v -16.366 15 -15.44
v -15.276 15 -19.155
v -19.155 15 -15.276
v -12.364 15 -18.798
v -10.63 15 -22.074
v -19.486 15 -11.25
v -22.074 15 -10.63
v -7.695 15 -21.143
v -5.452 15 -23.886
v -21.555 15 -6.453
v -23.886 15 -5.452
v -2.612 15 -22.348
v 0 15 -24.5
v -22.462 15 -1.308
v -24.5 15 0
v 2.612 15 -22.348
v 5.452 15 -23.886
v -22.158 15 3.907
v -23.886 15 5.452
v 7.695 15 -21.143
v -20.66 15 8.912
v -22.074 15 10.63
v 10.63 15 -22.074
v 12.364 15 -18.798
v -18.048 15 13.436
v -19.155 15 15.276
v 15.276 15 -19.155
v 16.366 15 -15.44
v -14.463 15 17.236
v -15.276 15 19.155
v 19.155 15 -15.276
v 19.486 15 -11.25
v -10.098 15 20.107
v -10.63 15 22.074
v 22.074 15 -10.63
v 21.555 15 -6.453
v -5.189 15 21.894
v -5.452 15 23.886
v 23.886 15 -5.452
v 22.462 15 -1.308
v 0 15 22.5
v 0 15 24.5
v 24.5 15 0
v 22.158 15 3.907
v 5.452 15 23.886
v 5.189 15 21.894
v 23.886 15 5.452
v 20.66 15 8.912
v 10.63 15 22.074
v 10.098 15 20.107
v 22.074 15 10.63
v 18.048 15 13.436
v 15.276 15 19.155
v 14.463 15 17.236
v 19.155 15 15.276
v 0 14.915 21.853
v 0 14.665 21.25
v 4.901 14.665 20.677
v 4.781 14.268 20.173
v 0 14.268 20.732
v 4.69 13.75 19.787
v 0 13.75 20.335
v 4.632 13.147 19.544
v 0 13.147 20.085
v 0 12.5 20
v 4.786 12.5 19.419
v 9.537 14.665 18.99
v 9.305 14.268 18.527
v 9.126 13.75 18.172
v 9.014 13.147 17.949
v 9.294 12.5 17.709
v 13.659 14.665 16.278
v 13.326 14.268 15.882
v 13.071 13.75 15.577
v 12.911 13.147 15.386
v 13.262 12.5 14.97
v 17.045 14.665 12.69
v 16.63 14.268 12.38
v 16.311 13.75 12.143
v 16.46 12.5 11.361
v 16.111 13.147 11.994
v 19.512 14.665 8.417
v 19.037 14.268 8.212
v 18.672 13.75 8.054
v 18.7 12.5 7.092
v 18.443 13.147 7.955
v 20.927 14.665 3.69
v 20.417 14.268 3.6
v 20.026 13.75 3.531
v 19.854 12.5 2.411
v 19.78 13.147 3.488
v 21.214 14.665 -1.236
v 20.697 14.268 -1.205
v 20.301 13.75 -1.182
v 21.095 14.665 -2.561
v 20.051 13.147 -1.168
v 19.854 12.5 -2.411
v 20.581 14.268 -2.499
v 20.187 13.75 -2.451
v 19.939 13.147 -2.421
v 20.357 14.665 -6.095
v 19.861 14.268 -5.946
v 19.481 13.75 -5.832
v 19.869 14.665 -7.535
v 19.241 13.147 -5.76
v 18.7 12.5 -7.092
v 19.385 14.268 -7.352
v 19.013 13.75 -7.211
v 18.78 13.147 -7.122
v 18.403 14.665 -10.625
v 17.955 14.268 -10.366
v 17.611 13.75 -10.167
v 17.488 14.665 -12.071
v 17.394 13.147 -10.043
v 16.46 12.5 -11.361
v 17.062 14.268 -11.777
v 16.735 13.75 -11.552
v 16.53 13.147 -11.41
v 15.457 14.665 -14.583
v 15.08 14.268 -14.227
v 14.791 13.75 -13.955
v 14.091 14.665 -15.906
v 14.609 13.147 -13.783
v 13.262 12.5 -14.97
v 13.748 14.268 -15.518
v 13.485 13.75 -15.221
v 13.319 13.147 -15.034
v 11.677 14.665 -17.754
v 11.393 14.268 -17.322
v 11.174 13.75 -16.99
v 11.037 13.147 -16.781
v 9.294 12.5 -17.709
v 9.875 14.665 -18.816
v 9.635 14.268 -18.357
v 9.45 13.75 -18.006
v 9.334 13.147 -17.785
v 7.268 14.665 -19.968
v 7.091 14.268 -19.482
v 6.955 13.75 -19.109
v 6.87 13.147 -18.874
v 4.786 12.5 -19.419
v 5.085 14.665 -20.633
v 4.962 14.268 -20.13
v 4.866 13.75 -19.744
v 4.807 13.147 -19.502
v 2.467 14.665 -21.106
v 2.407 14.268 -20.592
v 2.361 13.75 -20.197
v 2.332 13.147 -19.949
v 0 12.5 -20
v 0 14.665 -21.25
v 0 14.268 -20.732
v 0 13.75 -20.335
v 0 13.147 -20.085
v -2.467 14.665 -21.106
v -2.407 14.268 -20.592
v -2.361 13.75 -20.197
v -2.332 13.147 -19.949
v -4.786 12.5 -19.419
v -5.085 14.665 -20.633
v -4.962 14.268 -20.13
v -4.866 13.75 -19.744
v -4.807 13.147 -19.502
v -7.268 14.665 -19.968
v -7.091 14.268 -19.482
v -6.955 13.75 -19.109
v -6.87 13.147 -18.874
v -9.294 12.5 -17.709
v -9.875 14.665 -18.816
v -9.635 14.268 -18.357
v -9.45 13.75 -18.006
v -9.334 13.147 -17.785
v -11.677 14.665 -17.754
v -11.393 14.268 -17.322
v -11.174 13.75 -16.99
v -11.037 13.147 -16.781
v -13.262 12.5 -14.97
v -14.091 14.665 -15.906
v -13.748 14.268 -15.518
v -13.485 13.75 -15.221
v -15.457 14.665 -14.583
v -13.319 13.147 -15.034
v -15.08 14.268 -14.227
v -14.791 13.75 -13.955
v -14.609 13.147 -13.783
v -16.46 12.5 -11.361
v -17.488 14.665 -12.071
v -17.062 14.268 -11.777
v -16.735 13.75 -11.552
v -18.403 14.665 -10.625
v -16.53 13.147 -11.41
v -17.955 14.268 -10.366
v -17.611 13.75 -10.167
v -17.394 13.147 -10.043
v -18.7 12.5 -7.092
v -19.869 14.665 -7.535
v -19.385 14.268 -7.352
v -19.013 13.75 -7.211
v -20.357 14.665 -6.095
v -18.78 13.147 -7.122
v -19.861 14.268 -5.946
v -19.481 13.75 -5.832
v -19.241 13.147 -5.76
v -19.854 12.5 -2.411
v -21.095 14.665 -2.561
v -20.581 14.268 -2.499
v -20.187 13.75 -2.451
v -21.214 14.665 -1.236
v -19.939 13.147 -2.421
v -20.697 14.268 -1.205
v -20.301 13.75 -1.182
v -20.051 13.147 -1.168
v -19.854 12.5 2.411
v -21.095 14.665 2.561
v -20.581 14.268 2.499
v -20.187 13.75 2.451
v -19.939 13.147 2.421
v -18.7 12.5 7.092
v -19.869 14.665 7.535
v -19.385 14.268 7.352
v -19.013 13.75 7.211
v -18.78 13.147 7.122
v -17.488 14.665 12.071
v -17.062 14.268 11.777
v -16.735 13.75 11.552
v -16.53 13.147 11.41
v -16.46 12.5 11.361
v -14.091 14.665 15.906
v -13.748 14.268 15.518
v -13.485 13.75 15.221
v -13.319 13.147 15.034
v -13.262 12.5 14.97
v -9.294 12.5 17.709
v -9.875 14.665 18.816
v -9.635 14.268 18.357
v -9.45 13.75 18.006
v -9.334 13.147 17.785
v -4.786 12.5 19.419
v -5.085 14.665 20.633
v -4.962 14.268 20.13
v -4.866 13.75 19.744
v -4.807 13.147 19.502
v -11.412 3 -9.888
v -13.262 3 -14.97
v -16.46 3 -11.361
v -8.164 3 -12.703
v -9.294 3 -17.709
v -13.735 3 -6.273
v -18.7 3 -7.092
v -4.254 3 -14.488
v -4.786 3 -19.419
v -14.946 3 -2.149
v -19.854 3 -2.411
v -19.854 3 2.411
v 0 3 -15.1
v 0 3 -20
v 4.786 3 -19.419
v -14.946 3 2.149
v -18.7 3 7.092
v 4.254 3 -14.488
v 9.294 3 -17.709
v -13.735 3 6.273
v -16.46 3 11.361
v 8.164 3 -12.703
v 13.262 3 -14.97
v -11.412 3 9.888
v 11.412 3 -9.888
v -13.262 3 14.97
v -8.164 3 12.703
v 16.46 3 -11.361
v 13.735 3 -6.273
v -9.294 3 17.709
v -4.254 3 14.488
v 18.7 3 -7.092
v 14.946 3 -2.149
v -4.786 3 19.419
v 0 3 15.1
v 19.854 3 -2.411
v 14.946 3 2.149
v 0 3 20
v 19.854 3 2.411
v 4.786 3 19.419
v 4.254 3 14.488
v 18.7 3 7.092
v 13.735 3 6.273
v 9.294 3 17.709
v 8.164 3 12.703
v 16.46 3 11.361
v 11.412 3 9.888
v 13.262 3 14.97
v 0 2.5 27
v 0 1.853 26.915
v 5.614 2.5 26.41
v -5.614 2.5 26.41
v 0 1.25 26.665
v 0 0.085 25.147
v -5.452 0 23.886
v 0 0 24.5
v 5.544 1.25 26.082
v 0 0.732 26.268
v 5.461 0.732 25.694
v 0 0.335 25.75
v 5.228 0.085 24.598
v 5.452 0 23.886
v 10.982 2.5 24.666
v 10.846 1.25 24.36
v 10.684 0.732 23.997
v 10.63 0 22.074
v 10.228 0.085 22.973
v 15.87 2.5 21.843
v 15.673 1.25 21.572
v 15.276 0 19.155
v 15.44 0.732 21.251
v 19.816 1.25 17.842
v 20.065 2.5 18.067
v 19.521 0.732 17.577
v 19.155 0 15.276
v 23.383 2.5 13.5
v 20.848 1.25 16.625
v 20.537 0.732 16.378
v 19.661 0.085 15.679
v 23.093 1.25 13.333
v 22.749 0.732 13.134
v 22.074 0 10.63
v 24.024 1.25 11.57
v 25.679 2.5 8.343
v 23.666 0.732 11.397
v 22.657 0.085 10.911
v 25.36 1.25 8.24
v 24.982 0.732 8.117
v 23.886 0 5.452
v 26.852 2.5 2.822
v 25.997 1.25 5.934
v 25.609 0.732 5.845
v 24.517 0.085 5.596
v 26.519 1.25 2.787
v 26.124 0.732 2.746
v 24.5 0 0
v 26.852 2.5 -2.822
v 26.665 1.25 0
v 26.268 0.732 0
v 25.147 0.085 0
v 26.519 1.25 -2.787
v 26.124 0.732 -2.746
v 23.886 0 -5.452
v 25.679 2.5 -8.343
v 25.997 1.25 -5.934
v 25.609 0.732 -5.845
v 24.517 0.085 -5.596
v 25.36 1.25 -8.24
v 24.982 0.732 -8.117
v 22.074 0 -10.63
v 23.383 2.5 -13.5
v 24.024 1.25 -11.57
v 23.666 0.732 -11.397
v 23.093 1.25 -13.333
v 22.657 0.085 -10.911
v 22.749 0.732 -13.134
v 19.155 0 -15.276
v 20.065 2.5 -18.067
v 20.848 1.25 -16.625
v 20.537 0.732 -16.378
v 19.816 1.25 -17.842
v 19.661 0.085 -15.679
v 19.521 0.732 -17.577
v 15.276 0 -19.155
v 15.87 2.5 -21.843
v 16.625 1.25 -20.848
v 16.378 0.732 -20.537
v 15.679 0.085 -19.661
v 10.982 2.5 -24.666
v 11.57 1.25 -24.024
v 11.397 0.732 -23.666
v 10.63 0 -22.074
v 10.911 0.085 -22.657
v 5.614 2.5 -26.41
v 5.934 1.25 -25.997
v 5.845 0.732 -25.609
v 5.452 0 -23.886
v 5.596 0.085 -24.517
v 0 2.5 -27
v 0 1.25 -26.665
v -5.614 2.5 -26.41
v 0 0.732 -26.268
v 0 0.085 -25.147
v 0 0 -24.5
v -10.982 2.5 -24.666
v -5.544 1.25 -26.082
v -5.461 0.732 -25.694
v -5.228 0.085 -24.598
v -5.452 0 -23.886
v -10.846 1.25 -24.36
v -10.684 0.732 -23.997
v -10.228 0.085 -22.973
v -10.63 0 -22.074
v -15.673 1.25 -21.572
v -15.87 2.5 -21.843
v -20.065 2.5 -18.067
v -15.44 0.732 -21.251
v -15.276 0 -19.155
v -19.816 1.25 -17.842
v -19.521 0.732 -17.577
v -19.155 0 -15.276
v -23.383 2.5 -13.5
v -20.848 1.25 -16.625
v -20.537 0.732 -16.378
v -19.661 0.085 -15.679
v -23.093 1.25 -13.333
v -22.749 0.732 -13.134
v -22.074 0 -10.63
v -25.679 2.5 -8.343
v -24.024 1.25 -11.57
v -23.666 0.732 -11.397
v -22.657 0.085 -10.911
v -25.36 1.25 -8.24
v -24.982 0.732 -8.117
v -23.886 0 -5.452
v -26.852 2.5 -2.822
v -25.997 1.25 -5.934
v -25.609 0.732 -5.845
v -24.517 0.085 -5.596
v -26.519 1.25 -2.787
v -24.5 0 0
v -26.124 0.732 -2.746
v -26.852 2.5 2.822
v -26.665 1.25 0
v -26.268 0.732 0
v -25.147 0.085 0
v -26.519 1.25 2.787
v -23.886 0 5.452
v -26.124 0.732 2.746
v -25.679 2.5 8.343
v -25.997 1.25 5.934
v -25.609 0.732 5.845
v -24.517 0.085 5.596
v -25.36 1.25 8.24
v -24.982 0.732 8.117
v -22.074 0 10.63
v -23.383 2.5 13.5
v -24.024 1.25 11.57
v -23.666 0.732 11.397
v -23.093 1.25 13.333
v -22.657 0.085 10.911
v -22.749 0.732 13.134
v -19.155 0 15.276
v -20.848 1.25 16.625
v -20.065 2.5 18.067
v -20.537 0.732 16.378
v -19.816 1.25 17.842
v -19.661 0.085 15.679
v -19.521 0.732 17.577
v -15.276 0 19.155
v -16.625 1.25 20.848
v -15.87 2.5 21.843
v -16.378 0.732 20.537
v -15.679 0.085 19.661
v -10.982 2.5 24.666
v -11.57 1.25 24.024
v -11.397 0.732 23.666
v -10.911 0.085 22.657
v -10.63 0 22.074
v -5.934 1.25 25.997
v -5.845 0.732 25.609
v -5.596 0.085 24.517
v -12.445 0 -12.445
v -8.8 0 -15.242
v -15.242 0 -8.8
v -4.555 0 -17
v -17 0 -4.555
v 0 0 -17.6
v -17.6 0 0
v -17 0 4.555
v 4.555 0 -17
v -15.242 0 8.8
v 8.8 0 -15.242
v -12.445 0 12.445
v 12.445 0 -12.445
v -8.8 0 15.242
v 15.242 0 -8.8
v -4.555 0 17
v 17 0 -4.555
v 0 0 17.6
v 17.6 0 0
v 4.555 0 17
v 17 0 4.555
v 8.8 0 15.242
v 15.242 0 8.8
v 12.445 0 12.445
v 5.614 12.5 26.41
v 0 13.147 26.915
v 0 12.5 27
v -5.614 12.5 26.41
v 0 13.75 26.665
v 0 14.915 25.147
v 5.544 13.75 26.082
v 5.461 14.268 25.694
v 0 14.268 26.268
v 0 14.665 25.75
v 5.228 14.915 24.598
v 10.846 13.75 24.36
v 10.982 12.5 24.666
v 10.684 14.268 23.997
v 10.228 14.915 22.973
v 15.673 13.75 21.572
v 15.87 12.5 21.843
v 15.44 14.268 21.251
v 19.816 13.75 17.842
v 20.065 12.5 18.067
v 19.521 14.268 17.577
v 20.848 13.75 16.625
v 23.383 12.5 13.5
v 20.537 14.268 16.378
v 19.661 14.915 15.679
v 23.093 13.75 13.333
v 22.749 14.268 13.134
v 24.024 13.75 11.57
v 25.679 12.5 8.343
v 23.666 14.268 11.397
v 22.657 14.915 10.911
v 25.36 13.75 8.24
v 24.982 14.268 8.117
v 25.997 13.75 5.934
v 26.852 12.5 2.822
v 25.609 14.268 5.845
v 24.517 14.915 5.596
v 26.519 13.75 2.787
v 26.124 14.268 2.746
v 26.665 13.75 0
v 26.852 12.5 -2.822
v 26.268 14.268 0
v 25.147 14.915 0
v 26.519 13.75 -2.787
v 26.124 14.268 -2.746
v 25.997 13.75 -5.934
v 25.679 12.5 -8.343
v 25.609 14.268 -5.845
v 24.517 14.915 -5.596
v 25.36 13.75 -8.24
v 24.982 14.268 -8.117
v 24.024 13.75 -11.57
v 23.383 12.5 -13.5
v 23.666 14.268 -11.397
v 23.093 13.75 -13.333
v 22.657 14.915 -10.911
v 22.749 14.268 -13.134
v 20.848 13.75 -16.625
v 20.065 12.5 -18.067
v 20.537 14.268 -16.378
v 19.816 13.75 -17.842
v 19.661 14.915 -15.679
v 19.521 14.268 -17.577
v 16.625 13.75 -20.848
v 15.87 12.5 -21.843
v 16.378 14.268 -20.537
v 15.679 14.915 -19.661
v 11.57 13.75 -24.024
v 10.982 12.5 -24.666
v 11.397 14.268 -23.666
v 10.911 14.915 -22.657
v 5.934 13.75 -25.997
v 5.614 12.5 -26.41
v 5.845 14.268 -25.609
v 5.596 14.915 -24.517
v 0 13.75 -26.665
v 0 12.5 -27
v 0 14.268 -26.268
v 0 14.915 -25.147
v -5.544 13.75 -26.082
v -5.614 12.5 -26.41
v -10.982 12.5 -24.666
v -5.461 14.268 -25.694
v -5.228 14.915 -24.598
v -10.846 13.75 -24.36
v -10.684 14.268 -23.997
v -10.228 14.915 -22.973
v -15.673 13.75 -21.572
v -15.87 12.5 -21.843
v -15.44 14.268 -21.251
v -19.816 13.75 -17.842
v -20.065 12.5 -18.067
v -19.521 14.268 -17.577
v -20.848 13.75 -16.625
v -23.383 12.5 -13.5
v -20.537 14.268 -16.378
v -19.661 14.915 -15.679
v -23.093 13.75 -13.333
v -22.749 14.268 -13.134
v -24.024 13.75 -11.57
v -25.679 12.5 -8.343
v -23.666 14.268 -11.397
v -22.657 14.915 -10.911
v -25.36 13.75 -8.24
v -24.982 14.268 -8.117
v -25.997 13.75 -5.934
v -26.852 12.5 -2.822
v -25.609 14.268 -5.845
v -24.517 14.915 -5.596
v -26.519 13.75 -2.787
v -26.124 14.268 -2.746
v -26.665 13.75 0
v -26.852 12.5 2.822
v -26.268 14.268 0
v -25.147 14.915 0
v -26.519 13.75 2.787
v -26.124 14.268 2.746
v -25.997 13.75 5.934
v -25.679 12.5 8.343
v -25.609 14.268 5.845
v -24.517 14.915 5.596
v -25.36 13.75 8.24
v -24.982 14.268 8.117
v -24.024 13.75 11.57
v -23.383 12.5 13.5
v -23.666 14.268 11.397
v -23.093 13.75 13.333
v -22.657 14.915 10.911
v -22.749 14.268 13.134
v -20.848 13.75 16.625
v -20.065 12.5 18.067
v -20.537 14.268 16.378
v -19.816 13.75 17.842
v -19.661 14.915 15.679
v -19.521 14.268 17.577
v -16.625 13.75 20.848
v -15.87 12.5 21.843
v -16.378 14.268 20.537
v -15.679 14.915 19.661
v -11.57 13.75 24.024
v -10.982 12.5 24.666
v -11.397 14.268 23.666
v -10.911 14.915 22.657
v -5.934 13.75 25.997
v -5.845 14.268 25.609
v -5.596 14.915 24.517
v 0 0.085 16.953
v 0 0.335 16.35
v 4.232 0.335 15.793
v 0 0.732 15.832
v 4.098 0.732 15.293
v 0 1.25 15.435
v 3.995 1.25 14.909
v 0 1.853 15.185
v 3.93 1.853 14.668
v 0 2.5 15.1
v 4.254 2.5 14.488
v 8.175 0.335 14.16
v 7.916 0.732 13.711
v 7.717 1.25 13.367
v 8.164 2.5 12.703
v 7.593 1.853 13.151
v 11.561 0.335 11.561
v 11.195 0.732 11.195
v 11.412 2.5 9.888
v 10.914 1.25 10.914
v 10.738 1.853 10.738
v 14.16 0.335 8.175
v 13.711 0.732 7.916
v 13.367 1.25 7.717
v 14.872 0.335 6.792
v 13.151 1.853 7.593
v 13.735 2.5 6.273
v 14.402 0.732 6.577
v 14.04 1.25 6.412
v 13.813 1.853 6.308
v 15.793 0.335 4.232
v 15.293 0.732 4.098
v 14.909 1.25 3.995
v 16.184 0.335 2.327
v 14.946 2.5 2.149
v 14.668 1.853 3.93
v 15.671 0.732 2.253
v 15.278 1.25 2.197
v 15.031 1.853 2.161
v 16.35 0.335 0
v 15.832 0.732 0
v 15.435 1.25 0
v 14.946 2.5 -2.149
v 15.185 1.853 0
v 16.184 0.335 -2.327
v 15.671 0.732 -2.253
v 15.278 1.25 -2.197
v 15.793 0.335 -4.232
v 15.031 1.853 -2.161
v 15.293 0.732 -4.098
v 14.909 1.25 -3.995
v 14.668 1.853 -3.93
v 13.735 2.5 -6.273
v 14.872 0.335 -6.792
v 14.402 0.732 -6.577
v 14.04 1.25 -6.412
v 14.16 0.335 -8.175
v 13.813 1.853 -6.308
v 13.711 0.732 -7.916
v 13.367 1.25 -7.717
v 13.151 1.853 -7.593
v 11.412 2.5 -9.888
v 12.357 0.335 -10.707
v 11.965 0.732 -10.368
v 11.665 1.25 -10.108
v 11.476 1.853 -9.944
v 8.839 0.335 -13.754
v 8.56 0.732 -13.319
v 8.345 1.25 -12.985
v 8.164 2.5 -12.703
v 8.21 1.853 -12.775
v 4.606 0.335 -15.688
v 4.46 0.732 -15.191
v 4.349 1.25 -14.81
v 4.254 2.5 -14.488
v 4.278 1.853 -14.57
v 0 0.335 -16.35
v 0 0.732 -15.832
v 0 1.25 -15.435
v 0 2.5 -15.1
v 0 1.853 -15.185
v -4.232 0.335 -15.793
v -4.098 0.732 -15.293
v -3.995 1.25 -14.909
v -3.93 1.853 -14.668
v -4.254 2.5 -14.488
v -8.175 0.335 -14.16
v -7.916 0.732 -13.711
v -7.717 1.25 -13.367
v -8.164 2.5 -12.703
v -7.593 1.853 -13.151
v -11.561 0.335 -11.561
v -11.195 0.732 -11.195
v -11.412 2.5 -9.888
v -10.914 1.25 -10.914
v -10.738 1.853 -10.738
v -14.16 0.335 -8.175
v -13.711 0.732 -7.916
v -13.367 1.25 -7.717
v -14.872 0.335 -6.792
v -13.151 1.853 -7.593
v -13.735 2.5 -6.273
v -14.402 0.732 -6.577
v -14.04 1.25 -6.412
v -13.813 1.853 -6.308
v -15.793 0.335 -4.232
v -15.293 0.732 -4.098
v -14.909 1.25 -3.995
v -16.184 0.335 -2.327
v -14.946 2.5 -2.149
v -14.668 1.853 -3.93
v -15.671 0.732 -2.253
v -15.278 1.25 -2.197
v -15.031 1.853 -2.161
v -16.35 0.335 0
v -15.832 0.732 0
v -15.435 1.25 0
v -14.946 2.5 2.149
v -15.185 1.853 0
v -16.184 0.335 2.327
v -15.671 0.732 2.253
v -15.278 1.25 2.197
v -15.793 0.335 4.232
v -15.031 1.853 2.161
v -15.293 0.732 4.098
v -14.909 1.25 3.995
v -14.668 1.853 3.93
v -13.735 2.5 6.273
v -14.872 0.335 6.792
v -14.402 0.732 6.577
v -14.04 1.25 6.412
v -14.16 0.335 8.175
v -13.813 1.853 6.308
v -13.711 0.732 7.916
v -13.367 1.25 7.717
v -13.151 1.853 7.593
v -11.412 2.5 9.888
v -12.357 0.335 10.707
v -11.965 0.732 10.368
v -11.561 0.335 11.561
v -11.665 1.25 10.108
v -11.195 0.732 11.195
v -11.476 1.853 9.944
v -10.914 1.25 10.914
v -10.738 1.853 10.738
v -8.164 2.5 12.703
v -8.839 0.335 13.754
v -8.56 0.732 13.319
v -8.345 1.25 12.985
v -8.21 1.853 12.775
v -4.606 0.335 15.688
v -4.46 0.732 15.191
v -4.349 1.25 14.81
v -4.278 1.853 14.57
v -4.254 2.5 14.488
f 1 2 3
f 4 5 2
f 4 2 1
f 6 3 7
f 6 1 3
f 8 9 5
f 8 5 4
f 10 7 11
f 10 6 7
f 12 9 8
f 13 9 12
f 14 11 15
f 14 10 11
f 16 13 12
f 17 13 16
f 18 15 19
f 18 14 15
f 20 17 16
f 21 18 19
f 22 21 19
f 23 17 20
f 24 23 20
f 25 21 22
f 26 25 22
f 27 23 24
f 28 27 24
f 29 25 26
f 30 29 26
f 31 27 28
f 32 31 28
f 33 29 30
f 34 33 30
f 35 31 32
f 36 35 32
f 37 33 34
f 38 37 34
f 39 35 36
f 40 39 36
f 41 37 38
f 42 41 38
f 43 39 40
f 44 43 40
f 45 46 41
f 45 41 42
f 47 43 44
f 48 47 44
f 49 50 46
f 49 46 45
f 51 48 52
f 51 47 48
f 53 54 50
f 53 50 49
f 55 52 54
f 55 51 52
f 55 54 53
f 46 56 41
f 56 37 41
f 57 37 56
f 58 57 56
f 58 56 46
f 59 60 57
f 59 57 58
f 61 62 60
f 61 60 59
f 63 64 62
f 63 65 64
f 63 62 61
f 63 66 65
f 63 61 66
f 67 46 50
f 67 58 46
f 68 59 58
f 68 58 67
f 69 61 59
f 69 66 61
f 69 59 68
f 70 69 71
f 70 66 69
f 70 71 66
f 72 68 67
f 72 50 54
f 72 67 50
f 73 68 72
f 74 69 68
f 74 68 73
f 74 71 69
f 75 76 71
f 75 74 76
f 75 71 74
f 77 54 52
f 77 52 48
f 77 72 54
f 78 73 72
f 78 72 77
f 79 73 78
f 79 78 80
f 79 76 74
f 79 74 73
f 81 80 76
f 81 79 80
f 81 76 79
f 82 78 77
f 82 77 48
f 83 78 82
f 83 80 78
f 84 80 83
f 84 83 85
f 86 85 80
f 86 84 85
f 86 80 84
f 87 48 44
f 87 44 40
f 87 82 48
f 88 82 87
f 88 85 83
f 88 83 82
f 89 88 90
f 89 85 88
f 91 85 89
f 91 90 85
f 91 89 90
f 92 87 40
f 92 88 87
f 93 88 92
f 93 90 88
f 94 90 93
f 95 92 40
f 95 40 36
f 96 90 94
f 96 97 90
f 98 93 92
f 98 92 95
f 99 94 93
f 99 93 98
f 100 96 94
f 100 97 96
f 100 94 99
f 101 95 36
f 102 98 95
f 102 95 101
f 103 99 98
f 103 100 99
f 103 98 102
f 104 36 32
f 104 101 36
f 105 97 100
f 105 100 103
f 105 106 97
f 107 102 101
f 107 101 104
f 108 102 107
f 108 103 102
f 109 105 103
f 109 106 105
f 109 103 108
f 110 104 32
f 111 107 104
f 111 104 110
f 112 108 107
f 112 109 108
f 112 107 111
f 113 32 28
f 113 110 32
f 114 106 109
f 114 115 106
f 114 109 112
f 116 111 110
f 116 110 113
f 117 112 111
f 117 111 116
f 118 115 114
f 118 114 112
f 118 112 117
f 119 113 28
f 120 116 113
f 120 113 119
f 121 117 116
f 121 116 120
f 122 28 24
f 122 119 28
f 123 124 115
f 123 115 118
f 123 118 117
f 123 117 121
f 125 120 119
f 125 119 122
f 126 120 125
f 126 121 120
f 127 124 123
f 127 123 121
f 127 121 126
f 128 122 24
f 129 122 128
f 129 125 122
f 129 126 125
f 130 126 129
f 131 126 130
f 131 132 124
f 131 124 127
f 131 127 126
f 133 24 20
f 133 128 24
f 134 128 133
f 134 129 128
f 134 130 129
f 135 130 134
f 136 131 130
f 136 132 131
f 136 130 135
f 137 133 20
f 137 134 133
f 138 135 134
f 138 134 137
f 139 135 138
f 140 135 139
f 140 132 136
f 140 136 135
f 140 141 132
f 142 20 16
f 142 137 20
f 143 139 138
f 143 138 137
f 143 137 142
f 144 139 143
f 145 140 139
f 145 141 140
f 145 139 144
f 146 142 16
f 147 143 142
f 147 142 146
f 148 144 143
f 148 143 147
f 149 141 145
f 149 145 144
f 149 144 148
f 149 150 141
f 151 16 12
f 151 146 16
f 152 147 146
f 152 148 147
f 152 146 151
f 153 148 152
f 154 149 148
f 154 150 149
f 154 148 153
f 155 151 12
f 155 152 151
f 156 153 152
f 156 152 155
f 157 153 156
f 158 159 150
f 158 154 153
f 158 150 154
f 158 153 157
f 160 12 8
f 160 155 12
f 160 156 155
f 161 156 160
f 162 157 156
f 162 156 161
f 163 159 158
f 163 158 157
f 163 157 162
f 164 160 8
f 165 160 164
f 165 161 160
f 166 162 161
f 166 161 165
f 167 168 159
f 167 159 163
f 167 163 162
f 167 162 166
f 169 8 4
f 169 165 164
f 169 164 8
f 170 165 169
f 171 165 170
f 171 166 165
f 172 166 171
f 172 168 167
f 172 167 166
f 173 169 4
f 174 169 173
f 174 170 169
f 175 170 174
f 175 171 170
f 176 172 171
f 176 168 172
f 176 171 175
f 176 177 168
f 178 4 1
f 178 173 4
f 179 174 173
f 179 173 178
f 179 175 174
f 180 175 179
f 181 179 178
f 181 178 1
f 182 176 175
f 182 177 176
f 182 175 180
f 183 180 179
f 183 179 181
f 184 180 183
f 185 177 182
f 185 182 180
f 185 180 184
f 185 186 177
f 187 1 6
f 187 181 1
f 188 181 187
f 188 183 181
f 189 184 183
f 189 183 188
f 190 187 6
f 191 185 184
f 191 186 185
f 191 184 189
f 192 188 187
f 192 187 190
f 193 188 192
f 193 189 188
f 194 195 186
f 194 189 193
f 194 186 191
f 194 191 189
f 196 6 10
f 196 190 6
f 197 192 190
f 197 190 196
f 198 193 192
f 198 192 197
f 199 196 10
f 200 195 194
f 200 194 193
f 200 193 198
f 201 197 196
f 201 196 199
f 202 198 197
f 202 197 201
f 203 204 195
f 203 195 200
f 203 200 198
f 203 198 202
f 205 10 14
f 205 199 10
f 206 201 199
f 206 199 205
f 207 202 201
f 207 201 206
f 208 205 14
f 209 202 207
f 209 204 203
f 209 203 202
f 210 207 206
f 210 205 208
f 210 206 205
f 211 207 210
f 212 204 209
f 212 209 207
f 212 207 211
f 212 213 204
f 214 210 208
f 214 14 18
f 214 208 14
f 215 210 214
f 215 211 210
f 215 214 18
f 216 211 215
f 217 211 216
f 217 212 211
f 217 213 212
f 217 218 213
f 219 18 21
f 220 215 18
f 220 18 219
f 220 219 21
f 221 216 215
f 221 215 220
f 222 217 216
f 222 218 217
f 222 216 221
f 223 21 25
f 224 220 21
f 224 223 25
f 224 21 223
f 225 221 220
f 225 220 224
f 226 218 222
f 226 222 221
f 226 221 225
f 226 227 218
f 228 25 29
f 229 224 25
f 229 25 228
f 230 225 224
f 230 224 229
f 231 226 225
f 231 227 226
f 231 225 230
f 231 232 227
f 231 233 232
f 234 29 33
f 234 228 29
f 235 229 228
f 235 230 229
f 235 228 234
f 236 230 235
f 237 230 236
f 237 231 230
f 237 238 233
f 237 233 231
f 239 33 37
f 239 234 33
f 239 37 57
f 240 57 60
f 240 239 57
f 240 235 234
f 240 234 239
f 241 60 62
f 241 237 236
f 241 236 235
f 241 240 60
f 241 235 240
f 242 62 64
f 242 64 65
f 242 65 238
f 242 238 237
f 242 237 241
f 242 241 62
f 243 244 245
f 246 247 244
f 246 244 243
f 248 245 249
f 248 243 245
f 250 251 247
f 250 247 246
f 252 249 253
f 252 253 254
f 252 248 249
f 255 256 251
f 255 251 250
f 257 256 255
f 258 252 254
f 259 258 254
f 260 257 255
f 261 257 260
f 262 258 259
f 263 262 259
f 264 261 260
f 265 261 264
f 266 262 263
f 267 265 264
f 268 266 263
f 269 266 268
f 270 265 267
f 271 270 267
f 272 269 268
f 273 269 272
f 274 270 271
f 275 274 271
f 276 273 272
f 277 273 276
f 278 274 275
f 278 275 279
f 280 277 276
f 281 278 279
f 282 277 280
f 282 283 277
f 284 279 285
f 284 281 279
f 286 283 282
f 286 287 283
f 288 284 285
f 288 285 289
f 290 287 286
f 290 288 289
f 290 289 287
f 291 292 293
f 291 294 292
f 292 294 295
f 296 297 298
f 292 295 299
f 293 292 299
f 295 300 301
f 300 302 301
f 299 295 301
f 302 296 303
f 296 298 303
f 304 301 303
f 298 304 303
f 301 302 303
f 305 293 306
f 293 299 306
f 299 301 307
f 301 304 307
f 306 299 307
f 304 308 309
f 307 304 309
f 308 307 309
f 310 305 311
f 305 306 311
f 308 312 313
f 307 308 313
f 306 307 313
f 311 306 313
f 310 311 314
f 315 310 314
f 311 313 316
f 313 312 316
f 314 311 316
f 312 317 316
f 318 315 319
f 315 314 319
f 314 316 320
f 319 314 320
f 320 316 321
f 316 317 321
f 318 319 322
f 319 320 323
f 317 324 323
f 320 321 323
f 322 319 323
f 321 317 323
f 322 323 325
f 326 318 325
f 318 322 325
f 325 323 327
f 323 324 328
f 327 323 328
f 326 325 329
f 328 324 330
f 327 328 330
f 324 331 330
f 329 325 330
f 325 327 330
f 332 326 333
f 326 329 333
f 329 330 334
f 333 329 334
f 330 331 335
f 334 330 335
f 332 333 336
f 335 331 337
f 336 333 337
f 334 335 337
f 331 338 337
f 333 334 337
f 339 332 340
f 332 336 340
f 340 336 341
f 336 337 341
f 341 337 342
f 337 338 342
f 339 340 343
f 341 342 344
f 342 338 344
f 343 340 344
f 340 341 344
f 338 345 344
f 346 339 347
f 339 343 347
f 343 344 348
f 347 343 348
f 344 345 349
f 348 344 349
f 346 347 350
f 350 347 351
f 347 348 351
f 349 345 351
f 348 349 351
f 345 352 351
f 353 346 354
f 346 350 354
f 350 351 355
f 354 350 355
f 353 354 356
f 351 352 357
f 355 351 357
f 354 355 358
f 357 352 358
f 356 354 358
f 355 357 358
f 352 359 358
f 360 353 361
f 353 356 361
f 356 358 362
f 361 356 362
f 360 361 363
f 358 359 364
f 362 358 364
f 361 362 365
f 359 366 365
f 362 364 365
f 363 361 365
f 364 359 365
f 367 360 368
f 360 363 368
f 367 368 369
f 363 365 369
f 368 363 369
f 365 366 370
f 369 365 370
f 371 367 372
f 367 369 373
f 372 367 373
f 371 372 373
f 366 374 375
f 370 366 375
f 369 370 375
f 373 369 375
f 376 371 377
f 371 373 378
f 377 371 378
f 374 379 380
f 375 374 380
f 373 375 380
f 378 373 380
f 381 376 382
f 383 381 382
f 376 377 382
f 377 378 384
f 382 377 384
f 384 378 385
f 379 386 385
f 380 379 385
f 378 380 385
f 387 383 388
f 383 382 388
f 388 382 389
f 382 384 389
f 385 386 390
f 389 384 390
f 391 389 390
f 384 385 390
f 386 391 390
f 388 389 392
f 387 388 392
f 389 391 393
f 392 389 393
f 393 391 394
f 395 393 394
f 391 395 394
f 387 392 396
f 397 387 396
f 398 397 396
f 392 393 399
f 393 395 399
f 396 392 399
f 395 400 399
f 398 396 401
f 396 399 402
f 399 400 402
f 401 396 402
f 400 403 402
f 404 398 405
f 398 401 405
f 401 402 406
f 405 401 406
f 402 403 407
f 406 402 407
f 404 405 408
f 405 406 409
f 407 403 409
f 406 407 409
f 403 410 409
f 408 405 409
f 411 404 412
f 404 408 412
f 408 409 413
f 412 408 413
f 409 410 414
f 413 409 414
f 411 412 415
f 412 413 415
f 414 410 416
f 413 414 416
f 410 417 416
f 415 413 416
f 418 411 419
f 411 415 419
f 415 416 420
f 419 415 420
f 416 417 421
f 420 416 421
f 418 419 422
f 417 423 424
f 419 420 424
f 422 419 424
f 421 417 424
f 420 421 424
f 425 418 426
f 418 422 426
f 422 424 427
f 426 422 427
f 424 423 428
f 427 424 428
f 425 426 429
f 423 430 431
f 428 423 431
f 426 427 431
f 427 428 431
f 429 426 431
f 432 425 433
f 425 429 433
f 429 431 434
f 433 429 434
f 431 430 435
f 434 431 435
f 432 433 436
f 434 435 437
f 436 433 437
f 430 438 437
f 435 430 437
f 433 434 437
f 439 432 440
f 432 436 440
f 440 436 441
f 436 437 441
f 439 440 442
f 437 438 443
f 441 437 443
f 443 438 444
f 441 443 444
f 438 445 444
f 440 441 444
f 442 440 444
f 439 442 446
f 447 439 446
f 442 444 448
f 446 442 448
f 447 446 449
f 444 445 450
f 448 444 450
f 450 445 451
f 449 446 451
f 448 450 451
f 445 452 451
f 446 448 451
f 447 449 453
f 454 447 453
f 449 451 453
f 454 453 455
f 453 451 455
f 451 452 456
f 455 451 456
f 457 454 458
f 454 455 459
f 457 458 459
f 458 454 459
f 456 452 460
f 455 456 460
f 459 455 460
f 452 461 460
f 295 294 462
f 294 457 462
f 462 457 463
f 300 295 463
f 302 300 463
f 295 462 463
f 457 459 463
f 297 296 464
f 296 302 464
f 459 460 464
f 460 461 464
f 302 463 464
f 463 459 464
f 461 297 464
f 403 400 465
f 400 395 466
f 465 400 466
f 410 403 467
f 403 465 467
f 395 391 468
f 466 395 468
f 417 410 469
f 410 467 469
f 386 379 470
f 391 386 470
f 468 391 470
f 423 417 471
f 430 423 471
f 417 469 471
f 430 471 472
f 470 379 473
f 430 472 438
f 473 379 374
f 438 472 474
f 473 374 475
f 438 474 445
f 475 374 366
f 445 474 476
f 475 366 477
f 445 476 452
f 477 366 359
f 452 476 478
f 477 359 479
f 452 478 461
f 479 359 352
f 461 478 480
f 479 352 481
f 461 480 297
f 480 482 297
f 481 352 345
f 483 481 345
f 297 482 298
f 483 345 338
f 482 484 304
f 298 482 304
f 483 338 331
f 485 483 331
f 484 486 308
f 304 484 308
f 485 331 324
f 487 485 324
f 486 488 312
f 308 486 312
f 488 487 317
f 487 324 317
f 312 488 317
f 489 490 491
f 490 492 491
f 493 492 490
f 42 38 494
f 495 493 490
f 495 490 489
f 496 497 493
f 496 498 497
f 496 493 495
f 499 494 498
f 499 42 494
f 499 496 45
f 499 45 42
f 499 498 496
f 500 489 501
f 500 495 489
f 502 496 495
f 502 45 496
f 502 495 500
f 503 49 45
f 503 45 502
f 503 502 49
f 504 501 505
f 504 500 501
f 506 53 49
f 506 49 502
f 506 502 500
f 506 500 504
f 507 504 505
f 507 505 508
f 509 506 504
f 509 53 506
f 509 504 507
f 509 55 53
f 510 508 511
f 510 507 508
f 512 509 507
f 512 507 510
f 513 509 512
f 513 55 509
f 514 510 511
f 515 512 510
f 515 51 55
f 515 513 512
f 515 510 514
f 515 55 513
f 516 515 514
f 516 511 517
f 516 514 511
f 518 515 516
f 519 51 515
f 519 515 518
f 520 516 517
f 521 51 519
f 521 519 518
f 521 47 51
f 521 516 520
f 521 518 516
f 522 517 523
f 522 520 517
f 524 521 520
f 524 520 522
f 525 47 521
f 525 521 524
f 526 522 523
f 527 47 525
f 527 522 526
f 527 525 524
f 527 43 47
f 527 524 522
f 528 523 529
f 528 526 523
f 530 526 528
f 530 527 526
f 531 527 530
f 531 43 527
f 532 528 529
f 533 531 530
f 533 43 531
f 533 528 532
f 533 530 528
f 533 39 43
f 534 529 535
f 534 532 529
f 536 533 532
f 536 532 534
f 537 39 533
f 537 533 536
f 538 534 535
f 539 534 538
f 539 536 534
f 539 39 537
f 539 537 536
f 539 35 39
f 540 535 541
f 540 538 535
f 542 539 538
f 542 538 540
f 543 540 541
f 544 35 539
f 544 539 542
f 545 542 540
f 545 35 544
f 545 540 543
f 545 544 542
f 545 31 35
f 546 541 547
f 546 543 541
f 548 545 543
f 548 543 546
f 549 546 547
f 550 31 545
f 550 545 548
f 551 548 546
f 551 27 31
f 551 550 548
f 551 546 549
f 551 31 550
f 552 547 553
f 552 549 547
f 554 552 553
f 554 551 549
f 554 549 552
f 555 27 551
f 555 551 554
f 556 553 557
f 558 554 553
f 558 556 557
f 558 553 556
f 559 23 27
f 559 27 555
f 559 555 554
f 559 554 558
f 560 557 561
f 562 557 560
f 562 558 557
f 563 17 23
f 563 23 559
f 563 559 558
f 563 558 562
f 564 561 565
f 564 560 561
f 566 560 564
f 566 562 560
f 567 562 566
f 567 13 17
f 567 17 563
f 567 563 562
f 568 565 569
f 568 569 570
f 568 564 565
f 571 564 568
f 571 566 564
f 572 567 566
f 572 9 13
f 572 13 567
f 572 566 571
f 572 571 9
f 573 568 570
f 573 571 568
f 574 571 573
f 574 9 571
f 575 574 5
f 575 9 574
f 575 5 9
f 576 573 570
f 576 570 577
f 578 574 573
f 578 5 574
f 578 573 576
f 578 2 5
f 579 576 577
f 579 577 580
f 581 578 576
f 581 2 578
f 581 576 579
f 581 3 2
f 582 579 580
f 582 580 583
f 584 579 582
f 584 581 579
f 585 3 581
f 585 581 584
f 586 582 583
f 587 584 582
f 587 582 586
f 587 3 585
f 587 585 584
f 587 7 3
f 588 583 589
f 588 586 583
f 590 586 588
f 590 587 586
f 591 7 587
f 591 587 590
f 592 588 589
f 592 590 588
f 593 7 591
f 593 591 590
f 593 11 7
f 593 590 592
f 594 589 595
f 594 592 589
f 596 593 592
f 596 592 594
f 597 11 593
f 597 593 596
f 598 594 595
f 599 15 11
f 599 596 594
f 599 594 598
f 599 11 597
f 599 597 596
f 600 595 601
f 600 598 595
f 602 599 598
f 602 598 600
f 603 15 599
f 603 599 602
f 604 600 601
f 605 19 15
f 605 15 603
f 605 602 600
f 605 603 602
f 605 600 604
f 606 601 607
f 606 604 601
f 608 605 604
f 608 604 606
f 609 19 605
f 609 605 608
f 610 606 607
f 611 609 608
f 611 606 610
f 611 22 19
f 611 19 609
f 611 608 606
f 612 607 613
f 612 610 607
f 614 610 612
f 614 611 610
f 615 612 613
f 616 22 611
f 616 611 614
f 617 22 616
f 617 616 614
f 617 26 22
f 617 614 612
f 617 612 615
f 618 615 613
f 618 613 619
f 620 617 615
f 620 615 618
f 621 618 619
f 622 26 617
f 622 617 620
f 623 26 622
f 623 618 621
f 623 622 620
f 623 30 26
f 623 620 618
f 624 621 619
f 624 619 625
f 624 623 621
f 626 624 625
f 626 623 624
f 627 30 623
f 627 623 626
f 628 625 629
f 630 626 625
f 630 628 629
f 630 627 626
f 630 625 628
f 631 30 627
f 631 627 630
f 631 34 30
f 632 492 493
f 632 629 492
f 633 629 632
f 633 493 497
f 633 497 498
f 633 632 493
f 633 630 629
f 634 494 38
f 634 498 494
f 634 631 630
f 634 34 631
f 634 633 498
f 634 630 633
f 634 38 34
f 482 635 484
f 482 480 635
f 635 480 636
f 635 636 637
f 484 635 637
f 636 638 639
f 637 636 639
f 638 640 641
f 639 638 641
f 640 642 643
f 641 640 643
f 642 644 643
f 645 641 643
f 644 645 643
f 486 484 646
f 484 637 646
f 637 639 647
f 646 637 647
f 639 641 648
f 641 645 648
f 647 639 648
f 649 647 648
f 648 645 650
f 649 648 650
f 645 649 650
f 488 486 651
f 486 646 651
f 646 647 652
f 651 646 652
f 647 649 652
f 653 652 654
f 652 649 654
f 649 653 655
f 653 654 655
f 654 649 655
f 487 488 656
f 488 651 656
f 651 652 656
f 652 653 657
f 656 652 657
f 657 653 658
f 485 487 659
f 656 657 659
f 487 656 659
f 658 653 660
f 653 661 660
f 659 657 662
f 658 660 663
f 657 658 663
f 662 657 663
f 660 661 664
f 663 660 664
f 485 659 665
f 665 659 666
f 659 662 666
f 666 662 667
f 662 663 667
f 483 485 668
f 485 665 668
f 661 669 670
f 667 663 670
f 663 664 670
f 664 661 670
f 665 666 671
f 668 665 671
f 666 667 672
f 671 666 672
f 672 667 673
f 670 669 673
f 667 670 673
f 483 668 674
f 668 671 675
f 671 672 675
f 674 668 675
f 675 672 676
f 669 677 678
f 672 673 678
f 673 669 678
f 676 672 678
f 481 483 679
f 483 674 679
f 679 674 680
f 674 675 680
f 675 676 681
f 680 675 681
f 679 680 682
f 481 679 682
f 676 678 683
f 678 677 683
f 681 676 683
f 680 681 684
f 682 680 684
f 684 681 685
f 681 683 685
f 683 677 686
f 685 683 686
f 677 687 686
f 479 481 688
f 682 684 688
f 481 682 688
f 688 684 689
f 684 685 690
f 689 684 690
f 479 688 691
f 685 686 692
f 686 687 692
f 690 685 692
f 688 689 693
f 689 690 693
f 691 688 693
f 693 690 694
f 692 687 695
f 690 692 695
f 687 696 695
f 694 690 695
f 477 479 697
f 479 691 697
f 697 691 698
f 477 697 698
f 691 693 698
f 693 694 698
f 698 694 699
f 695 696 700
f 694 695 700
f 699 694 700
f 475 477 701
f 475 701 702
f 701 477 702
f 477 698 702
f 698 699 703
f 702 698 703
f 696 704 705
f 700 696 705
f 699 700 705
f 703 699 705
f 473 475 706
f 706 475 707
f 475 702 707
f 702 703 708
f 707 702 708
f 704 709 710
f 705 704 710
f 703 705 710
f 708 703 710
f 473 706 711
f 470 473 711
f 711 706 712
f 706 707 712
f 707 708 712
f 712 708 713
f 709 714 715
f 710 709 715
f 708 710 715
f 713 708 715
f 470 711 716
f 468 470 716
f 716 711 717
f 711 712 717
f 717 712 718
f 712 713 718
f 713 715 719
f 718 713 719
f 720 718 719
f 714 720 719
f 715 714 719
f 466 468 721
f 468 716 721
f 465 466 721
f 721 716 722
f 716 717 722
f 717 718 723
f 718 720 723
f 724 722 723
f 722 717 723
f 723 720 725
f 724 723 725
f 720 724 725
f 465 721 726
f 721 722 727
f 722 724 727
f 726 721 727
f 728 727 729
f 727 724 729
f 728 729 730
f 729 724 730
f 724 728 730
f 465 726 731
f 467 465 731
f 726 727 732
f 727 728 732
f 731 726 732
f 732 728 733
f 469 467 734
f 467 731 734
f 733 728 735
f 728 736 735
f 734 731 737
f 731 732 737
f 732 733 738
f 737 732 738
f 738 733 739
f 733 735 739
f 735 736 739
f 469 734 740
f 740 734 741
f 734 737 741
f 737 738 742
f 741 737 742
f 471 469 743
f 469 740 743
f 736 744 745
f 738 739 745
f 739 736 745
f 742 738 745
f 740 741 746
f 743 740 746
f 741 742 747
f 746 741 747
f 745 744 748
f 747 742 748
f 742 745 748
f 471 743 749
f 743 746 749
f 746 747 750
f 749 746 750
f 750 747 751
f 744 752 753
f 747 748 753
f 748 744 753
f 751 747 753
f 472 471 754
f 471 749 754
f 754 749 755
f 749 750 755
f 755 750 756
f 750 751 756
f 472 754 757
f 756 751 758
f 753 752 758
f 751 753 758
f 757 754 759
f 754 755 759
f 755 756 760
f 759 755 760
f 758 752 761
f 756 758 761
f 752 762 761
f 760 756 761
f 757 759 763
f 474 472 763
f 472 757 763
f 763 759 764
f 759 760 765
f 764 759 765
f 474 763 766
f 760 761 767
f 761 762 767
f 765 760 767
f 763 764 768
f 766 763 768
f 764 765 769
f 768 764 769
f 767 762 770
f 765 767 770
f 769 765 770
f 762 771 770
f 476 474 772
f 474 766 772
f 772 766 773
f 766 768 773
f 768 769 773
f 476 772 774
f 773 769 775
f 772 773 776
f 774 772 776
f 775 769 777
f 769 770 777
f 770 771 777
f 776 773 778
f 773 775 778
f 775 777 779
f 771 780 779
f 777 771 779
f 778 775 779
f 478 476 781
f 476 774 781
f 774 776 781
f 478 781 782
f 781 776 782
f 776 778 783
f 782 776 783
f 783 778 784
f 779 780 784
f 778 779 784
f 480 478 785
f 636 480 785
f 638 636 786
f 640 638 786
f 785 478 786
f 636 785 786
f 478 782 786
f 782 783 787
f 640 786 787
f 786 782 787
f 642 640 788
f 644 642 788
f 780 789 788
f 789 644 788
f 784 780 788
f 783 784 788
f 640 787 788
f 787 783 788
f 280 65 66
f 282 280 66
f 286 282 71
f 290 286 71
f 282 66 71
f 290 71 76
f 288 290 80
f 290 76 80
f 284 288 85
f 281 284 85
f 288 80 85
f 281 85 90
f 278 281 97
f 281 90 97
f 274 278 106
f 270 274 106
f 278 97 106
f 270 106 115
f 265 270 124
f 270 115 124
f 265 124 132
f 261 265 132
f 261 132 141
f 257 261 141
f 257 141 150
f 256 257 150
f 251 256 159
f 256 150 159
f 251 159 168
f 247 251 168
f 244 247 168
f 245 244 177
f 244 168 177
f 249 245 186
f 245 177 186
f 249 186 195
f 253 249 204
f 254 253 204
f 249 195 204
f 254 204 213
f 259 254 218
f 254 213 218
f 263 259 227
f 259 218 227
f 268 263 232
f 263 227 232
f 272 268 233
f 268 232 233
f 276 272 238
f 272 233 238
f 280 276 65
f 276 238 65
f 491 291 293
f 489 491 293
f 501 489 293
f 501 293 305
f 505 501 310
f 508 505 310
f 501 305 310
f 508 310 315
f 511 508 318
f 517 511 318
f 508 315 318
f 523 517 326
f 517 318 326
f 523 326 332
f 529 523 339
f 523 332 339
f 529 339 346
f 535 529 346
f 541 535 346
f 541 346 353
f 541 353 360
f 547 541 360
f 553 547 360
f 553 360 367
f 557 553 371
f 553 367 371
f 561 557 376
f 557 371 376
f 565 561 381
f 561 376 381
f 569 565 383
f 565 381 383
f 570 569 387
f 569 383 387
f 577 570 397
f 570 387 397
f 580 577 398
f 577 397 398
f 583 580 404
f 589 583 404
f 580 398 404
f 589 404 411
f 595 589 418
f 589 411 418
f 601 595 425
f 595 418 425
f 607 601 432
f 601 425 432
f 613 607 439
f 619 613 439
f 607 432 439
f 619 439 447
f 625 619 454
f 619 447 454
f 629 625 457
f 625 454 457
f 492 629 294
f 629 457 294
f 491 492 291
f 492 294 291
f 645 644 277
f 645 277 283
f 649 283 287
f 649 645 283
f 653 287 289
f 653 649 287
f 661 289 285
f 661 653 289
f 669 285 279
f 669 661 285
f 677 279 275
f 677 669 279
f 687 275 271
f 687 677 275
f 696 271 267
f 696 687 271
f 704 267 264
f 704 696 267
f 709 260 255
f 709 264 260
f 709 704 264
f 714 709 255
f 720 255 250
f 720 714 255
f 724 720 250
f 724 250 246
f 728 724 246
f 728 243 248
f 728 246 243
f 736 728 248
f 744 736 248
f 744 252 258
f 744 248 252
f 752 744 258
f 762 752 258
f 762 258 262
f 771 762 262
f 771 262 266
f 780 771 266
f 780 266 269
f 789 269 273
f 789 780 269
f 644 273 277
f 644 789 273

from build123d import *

# Parameters (mm, degrees)
ESQUISSE1_R             = 27
ESQUISSE1_R_2           = 15.1
BOSS_EXTRU_1_DEPTH      = 15
ESQUISSE2_R             = 20
ENL_V_MAT_EXTRU_1_DEPTH = 12
CONG_1_R                = 2.5


with BuildPart() as part:
    # Esquisse1 → Boss.-Extru.1 (new body)
    with BuildSketch(Plane(origin=(0, 0, 0), x_dir=(1, 0, 0), z_dir=(0, 1, 0))):
        with Locations(Location((0, 0, 0), (0, 0, 270))):  # turned: the seam where the file's is
            Circle(ESQUISSE1_R)
        with Locations(Location((0, 0, 0), (0, 0, 270))):  # turned: the seam where the file's is
            Circle(ESQUISSE1_R_2, mode=Mode.SUBTRACT)
    extrude(amount=BOSS_EXTRU_1_DEPTH)

    # Esquisse2 → Enlèv. mat.-Extru.1 (cut)
    with BuildSketch(Plane(origin=(0, 15, 0), x_dir=(-1, 0, 0), z_dir=(0, 1, 0))):
        with Locations(Location((0, 0, 0), (0, 0, 90))):  # turned: the seam where the file's is
            Circle(ESQUISSE2_R)
    extrude(amount=-ENL_V_MAT_EXTRU_1_DEPTH, mode=Mode.SUBTRACT)

    # Congé1
    cong_1_edges = [part.edges().sort_by_distance(p)[0] for p in [
        (0, 15, -20),
        (0, 0, -27),
        (0, 15, -27),
        (0, 0, -15.1),
    ]]
    fillet(cong_1_edges, radius=CONG_1_R)


solid = part.part
